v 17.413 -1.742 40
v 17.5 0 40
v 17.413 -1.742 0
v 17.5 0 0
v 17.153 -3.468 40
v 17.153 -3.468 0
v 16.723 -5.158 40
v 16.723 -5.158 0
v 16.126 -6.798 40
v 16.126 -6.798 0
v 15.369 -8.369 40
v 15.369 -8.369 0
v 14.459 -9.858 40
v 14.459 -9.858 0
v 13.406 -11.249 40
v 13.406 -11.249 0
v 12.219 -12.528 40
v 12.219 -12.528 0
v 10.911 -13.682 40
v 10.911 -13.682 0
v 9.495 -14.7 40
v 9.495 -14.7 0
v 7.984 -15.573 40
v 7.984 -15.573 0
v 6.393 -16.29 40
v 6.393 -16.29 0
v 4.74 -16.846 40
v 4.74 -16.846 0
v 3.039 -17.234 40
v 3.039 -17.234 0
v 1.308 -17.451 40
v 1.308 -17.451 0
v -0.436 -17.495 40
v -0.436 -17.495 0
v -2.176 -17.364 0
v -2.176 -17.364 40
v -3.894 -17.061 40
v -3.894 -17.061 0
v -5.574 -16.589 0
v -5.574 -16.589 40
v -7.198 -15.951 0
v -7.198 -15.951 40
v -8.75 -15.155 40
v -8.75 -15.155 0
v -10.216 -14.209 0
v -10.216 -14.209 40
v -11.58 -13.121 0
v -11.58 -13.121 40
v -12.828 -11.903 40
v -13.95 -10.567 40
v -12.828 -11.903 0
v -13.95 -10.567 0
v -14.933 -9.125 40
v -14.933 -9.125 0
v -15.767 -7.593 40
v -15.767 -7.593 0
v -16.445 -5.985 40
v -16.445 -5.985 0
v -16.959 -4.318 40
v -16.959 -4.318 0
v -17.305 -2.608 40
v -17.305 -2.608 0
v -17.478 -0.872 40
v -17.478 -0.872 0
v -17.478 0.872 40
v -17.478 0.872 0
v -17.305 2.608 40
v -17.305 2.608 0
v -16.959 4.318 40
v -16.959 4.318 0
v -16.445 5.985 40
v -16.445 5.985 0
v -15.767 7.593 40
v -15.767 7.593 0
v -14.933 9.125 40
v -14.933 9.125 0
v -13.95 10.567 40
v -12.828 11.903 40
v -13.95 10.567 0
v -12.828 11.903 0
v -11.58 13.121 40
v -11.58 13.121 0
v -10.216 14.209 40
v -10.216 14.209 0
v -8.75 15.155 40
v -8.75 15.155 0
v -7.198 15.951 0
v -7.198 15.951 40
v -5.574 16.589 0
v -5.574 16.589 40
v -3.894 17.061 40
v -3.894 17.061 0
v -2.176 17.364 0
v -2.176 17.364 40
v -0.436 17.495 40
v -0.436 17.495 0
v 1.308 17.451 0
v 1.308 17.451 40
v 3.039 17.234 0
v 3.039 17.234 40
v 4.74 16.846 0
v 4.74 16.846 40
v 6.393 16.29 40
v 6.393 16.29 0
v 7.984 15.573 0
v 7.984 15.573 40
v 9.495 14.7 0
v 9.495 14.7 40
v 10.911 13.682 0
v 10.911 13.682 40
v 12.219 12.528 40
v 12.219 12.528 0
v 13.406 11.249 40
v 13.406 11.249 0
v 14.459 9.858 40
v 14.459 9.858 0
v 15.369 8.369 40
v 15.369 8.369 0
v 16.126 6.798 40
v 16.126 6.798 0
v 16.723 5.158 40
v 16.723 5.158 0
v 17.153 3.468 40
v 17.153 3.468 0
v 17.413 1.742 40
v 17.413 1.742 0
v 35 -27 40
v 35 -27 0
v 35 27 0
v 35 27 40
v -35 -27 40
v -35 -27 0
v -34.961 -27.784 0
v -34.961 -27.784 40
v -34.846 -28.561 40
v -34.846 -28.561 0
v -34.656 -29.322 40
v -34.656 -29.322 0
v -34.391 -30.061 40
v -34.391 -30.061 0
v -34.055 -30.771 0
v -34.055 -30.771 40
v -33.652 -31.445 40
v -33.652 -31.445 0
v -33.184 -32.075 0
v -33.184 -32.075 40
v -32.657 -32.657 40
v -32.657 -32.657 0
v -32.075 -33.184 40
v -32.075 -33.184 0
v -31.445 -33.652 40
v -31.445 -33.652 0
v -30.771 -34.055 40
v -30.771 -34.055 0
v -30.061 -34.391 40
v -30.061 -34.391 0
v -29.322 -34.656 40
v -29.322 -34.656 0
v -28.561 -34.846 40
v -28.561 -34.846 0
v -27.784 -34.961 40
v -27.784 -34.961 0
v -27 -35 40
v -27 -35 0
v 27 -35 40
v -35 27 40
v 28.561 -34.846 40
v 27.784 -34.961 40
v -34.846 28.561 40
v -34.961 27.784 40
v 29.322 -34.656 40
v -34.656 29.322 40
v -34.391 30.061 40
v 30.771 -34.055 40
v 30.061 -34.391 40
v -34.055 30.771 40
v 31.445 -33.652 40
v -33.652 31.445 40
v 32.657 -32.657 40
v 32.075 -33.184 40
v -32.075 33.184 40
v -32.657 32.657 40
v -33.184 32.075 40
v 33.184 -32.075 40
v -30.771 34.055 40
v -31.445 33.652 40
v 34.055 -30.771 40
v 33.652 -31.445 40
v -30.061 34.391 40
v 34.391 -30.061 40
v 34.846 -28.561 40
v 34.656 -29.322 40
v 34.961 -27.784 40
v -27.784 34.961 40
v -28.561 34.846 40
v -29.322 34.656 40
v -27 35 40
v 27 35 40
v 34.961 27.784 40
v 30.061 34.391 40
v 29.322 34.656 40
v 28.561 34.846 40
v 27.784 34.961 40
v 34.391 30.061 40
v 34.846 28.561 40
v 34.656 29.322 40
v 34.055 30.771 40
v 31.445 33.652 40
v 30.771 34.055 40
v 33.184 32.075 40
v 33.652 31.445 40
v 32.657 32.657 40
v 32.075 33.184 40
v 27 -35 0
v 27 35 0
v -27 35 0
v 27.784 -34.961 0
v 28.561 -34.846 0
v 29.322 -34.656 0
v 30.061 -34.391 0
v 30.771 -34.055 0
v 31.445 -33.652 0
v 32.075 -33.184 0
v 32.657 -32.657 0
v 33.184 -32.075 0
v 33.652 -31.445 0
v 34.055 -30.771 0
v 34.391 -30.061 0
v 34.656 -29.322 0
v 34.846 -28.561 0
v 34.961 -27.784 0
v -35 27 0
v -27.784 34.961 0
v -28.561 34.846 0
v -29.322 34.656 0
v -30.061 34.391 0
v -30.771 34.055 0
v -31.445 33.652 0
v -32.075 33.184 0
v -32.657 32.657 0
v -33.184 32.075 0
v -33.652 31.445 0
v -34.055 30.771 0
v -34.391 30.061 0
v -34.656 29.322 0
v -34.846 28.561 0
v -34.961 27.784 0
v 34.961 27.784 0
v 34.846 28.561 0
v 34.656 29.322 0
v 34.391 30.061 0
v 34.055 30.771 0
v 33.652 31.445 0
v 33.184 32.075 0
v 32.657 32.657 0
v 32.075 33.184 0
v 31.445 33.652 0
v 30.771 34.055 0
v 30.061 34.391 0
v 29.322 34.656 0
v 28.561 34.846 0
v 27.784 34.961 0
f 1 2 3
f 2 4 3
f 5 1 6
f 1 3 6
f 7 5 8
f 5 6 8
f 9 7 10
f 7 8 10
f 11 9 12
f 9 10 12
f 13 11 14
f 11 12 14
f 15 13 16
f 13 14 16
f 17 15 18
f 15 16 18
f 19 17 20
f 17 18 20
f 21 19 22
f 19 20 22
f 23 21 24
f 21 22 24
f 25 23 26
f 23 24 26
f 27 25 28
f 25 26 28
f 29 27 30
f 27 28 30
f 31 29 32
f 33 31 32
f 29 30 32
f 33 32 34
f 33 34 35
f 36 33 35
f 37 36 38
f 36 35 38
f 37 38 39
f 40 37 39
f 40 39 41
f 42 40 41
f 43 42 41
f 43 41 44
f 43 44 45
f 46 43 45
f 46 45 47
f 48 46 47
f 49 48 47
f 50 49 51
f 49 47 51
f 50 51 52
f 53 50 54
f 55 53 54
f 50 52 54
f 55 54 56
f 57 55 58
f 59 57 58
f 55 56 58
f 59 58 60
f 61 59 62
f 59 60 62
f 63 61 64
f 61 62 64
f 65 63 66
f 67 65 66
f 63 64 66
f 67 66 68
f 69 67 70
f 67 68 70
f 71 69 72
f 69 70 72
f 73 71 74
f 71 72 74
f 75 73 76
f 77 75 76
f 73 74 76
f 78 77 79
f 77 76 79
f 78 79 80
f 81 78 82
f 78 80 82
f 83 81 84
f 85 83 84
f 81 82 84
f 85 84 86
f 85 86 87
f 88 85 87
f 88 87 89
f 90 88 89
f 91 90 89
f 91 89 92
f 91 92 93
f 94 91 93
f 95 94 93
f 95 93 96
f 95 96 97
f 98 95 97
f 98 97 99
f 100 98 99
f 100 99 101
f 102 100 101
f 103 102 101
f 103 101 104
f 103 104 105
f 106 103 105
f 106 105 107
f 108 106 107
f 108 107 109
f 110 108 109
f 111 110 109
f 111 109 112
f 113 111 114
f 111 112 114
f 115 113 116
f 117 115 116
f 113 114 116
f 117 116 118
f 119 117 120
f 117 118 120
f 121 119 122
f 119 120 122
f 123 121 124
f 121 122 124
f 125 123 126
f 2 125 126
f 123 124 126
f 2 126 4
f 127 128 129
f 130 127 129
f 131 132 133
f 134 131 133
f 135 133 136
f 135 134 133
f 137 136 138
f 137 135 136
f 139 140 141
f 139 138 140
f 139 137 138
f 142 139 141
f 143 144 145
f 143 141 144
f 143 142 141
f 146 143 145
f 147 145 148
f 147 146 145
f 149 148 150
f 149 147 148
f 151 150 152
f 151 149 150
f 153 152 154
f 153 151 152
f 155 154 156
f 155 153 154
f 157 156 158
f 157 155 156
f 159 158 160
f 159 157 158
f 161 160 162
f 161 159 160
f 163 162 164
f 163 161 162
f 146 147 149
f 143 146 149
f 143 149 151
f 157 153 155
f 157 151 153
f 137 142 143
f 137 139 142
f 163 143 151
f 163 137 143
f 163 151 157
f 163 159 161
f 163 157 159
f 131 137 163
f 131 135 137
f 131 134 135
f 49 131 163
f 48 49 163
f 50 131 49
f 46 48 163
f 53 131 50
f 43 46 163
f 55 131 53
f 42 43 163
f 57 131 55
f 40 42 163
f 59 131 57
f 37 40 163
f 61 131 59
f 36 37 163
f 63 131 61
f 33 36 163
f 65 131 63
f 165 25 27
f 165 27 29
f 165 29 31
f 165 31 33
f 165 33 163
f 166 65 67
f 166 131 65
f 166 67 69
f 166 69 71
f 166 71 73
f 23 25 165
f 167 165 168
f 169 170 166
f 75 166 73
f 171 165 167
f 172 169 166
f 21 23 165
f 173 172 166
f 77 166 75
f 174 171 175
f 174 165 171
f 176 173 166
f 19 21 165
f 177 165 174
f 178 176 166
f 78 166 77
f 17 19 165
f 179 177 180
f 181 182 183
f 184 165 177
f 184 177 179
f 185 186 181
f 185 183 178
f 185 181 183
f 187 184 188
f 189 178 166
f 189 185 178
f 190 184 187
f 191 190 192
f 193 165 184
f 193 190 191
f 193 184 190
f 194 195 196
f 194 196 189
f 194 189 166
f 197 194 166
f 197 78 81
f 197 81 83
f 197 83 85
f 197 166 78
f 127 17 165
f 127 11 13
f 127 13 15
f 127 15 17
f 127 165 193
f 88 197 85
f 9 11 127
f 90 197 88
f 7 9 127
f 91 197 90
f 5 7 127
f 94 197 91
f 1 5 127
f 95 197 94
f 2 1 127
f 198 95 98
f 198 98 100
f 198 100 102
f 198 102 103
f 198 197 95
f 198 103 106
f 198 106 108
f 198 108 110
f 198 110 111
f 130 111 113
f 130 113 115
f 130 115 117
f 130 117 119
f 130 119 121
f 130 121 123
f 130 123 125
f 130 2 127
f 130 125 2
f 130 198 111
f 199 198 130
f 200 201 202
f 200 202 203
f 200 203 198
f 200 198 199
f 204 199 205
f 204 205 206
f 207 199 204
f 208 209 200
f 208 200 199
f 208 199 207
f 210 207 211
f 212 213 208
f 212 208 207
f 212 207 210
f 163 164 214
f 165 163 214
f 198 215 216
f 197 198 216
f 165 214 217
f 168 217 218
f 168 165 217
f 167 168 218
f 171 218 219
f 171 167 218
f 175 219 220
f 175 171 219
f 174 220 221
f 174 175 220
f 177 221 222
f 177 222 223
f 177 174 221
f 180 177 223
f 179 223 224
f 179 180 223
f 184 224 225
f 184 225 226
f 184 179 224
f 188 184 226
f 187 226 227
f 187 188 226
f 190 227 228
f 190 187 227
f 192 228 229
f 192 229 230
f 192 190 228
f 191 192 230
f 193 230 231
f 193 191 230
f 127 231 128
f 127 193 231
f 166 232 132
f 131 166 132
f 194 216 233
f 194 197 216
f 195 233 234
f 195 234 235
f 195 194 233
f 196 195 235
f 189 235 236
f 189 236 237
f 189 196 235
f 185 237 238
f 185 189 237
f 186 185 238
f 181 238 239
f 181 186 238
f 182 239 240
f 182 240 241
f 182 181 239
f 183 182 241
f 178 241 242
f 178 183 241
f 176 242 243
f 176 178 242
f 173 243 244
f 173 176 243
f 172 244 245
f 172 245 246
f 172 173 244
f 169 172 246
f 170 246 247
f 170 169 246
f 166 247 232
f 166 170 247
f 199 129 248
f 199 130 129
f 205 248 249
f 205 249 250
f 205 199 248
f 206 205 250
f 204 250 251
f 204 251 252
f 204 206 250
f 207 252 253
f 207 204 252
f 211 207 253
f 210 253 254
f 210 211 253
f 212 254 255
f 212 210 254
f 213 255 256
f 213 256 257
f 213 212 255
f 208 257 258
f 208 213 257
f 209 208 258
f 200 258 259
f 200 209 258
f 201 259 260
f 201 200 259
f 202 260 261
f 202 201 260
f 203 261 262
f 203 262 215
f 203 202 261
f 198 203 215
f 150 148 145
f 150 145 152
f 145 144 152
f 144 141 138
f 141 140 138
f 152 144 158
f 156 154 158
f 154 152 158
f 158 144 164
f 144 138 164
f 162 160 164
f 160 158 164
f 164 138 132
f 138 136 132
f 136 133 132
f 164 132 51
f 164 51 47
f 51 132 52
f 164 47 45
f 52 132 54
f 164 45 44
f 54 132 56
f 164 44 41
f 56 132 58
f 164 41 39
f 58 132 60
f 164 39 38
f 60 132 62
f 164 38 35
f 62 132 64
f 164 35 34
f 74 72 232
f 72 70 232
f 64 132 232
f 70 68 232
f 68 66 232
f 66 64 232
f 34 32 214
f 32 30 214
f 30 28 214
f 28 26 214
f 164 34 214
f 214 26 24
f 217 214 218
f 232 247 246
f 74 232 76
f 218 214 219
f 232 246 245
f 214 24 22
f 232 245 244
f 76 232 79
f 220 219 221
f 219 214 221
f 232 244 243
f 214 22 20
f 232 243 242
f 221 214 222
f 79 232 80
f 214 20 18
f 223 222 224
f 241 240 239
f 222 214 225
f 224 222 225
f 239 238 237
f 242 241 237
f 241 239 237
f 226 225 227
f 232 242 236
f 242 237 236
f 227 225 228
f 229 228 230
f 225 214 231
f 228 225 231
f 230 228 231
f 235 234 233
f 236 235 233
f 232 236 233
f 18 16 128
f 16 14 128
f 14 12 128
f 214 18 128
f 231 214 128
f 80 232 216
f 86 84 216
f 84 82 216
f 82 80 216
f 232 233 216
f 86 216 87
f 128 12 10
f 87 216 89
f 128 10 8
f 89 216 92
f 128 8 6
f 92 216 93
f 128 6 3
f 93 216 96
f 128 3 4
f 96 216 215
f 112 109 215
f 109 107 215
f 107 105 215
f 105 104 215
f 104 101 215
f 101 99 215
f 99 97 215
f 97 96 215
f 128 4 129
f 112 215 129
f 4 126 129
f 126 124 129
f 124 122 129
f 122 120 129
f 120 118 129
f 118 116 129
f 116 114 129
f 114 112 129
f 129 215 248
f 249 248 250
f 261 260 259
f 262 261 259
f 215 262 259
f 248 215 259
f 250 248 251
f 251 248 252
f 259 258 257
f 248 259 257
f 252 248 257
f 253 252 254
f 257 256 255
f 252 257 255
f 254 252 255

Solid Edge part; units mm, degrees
sketch "Sketch1" plane through (0, 0, 0) normal (0, 0, 1) x (1, 0, 0)
  line L0 (-35, -35) -> (35, -35)
  line L1 (35, -35) -> (35, 35)
  line L2 (35, 35) -> (-35, 35)
  line L3 (-35, 35) -> (-35, -35)
extrude "ExtrudedProtrusion_1" add sketch "Sketch1" along normal blind 40
fillet "Round_1" radius 8 4 edges at (35, -35, 20) (35, 35, 20) (-35, -35, 20) (-35, 35, 20)
sketch "Sketch2" plane through (0, 0, 0) normal (0, 0, 1) x (1, 0, 0)
  circle A0 centre (0, 0) radius 17.5
extrude "ExtrudedCutout_1" cut sketch "Sketch2" along normal blind 118.7913
